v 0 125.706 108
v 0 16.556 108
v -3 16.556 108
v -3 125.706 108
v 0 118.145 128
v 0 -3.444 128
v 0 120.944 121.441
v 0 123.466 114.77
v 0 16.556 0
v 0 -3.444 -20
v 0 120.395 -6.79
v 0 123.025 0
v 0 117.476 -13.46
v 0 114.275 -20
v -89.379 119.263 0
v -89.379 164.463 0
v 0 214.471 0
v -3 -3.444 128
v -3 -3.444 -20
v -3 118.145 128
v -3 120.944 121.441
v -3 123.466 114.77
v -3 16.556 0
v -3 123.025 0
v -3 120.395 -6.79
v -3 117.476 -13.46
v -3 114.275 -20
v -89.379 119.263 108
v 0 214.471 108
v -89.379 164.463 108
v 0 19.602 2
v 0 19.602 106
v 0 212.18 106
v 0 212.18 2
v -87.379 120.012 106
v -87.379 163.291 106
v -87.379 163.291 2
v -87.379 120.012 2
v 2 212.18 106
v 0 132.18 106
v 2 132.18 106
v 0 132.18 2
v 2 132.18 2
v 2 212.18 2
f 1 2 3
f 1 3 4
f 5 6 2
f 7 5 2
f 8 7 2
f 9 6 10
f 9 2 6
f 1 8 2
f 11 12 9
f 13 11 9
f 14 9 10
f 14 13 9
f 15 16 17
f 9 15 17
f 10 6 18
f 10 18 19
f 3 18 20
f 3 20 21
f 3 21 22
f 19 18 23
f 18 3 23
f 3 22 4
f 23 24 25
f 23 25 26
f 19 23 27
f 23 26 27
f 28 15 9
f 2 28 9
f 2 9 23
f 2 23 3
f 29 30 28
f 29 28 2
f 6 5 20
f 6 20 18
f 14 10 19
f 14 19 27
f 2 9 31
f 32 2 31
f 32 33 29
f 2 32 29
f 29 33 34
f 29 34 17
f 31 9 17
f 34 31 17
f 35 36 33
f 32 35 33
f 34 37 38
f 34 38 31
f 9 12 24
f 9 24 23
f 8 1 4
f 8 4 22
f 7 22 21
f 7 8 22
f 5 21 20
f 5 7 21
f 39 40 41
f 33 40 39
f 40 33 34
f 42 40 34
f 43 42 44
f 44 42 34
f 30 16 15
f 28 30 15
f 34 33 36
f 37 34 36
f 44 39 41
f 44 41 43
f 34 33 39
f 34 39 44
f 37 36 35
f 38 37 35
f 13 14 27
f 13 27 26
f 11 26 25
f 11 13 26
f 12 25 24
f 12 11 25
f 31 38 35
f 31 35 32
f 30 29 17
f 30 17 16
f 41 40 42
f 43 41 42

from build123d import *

# Parameters (mm, degrees)
BOSS_EXTRUDE1_DEPTH = 108
SHELL1_T            = -2
SKETCH5_W           = 104
SKETCH5_H           = 80
BOSS_EXTRUDE3_DEPTH = 2
BOSS_EXTRUDE9_DEPTH = 3


with BuildPart() as part:
    # Sketch1 → Boss-Extrude1 (new body)
    with BuildSketch(Plane.XY):
        Polygon((0, 214.471385382), (-89.379106021, 164.463309234), (-89.379106021, 119.263377535), (0, 16.555723533), align=None)
    extrude(amount=BOSS_EXTRUDE1_DEPTH)

    # Shell1
    shell1_openings = [part.faces().sort_by_distance(p)[0] for p in [
        (0, 115.513554458, 54),
    ]]
    offset(amount=SHELL1_T, openings=shell1_openings, kind=Kind.INTERSECTION)


with BuildPart() as body_2:
    # Sketch5 → Boss-Extrude3 (new body)
    with BuildSketch(Plane(origin=(0, 0, 0), x_dir=(0, 0, -1), z_dir=(1, 0, 0))):
        with Locations((-54, 172.179620919)):
            Rectangle(SKETCH5_W, SKETCH5_H)
    extrude(amount=BOSS_EXTRUDE3_DEPTH)


with BuildPart() as body_3:
    # Sketch6 → Boss-Extrude9 (new body)
    with BuildSketch(Plane(origin=(0, 0, 0), x_dir=(0, 0, -1), z_dir=(1, 0, 0))):
        with BuildLine():
            Line((0, 16.555723533), (-108, 16.555723533))
            Line((-108, 16.555723533), (-108, 125.706089257))
            ThreePointArc((-108, 125.706089257), (-118.11899718, 122.240119778), (-128, 118.144655013))
            Line((-128, 118.144655013), (-128, -3.444276467))
            Line((-128, -3.444276467), (20, -3.444276467))
            Line((20, -3.444276467), (20, 114.274981873))
            ThreePointArc((20, 114.274981873), (10.14060142, 118.97145575), (0, 123.025196008))
            Line((0, 123.025196008), (0, 16.555723533))
        make_face()
    extrude(amount=-BOSS_EXTRUDE9_DEPTH)


solid = Compound([part.part, body_2.part, body_3.part])
